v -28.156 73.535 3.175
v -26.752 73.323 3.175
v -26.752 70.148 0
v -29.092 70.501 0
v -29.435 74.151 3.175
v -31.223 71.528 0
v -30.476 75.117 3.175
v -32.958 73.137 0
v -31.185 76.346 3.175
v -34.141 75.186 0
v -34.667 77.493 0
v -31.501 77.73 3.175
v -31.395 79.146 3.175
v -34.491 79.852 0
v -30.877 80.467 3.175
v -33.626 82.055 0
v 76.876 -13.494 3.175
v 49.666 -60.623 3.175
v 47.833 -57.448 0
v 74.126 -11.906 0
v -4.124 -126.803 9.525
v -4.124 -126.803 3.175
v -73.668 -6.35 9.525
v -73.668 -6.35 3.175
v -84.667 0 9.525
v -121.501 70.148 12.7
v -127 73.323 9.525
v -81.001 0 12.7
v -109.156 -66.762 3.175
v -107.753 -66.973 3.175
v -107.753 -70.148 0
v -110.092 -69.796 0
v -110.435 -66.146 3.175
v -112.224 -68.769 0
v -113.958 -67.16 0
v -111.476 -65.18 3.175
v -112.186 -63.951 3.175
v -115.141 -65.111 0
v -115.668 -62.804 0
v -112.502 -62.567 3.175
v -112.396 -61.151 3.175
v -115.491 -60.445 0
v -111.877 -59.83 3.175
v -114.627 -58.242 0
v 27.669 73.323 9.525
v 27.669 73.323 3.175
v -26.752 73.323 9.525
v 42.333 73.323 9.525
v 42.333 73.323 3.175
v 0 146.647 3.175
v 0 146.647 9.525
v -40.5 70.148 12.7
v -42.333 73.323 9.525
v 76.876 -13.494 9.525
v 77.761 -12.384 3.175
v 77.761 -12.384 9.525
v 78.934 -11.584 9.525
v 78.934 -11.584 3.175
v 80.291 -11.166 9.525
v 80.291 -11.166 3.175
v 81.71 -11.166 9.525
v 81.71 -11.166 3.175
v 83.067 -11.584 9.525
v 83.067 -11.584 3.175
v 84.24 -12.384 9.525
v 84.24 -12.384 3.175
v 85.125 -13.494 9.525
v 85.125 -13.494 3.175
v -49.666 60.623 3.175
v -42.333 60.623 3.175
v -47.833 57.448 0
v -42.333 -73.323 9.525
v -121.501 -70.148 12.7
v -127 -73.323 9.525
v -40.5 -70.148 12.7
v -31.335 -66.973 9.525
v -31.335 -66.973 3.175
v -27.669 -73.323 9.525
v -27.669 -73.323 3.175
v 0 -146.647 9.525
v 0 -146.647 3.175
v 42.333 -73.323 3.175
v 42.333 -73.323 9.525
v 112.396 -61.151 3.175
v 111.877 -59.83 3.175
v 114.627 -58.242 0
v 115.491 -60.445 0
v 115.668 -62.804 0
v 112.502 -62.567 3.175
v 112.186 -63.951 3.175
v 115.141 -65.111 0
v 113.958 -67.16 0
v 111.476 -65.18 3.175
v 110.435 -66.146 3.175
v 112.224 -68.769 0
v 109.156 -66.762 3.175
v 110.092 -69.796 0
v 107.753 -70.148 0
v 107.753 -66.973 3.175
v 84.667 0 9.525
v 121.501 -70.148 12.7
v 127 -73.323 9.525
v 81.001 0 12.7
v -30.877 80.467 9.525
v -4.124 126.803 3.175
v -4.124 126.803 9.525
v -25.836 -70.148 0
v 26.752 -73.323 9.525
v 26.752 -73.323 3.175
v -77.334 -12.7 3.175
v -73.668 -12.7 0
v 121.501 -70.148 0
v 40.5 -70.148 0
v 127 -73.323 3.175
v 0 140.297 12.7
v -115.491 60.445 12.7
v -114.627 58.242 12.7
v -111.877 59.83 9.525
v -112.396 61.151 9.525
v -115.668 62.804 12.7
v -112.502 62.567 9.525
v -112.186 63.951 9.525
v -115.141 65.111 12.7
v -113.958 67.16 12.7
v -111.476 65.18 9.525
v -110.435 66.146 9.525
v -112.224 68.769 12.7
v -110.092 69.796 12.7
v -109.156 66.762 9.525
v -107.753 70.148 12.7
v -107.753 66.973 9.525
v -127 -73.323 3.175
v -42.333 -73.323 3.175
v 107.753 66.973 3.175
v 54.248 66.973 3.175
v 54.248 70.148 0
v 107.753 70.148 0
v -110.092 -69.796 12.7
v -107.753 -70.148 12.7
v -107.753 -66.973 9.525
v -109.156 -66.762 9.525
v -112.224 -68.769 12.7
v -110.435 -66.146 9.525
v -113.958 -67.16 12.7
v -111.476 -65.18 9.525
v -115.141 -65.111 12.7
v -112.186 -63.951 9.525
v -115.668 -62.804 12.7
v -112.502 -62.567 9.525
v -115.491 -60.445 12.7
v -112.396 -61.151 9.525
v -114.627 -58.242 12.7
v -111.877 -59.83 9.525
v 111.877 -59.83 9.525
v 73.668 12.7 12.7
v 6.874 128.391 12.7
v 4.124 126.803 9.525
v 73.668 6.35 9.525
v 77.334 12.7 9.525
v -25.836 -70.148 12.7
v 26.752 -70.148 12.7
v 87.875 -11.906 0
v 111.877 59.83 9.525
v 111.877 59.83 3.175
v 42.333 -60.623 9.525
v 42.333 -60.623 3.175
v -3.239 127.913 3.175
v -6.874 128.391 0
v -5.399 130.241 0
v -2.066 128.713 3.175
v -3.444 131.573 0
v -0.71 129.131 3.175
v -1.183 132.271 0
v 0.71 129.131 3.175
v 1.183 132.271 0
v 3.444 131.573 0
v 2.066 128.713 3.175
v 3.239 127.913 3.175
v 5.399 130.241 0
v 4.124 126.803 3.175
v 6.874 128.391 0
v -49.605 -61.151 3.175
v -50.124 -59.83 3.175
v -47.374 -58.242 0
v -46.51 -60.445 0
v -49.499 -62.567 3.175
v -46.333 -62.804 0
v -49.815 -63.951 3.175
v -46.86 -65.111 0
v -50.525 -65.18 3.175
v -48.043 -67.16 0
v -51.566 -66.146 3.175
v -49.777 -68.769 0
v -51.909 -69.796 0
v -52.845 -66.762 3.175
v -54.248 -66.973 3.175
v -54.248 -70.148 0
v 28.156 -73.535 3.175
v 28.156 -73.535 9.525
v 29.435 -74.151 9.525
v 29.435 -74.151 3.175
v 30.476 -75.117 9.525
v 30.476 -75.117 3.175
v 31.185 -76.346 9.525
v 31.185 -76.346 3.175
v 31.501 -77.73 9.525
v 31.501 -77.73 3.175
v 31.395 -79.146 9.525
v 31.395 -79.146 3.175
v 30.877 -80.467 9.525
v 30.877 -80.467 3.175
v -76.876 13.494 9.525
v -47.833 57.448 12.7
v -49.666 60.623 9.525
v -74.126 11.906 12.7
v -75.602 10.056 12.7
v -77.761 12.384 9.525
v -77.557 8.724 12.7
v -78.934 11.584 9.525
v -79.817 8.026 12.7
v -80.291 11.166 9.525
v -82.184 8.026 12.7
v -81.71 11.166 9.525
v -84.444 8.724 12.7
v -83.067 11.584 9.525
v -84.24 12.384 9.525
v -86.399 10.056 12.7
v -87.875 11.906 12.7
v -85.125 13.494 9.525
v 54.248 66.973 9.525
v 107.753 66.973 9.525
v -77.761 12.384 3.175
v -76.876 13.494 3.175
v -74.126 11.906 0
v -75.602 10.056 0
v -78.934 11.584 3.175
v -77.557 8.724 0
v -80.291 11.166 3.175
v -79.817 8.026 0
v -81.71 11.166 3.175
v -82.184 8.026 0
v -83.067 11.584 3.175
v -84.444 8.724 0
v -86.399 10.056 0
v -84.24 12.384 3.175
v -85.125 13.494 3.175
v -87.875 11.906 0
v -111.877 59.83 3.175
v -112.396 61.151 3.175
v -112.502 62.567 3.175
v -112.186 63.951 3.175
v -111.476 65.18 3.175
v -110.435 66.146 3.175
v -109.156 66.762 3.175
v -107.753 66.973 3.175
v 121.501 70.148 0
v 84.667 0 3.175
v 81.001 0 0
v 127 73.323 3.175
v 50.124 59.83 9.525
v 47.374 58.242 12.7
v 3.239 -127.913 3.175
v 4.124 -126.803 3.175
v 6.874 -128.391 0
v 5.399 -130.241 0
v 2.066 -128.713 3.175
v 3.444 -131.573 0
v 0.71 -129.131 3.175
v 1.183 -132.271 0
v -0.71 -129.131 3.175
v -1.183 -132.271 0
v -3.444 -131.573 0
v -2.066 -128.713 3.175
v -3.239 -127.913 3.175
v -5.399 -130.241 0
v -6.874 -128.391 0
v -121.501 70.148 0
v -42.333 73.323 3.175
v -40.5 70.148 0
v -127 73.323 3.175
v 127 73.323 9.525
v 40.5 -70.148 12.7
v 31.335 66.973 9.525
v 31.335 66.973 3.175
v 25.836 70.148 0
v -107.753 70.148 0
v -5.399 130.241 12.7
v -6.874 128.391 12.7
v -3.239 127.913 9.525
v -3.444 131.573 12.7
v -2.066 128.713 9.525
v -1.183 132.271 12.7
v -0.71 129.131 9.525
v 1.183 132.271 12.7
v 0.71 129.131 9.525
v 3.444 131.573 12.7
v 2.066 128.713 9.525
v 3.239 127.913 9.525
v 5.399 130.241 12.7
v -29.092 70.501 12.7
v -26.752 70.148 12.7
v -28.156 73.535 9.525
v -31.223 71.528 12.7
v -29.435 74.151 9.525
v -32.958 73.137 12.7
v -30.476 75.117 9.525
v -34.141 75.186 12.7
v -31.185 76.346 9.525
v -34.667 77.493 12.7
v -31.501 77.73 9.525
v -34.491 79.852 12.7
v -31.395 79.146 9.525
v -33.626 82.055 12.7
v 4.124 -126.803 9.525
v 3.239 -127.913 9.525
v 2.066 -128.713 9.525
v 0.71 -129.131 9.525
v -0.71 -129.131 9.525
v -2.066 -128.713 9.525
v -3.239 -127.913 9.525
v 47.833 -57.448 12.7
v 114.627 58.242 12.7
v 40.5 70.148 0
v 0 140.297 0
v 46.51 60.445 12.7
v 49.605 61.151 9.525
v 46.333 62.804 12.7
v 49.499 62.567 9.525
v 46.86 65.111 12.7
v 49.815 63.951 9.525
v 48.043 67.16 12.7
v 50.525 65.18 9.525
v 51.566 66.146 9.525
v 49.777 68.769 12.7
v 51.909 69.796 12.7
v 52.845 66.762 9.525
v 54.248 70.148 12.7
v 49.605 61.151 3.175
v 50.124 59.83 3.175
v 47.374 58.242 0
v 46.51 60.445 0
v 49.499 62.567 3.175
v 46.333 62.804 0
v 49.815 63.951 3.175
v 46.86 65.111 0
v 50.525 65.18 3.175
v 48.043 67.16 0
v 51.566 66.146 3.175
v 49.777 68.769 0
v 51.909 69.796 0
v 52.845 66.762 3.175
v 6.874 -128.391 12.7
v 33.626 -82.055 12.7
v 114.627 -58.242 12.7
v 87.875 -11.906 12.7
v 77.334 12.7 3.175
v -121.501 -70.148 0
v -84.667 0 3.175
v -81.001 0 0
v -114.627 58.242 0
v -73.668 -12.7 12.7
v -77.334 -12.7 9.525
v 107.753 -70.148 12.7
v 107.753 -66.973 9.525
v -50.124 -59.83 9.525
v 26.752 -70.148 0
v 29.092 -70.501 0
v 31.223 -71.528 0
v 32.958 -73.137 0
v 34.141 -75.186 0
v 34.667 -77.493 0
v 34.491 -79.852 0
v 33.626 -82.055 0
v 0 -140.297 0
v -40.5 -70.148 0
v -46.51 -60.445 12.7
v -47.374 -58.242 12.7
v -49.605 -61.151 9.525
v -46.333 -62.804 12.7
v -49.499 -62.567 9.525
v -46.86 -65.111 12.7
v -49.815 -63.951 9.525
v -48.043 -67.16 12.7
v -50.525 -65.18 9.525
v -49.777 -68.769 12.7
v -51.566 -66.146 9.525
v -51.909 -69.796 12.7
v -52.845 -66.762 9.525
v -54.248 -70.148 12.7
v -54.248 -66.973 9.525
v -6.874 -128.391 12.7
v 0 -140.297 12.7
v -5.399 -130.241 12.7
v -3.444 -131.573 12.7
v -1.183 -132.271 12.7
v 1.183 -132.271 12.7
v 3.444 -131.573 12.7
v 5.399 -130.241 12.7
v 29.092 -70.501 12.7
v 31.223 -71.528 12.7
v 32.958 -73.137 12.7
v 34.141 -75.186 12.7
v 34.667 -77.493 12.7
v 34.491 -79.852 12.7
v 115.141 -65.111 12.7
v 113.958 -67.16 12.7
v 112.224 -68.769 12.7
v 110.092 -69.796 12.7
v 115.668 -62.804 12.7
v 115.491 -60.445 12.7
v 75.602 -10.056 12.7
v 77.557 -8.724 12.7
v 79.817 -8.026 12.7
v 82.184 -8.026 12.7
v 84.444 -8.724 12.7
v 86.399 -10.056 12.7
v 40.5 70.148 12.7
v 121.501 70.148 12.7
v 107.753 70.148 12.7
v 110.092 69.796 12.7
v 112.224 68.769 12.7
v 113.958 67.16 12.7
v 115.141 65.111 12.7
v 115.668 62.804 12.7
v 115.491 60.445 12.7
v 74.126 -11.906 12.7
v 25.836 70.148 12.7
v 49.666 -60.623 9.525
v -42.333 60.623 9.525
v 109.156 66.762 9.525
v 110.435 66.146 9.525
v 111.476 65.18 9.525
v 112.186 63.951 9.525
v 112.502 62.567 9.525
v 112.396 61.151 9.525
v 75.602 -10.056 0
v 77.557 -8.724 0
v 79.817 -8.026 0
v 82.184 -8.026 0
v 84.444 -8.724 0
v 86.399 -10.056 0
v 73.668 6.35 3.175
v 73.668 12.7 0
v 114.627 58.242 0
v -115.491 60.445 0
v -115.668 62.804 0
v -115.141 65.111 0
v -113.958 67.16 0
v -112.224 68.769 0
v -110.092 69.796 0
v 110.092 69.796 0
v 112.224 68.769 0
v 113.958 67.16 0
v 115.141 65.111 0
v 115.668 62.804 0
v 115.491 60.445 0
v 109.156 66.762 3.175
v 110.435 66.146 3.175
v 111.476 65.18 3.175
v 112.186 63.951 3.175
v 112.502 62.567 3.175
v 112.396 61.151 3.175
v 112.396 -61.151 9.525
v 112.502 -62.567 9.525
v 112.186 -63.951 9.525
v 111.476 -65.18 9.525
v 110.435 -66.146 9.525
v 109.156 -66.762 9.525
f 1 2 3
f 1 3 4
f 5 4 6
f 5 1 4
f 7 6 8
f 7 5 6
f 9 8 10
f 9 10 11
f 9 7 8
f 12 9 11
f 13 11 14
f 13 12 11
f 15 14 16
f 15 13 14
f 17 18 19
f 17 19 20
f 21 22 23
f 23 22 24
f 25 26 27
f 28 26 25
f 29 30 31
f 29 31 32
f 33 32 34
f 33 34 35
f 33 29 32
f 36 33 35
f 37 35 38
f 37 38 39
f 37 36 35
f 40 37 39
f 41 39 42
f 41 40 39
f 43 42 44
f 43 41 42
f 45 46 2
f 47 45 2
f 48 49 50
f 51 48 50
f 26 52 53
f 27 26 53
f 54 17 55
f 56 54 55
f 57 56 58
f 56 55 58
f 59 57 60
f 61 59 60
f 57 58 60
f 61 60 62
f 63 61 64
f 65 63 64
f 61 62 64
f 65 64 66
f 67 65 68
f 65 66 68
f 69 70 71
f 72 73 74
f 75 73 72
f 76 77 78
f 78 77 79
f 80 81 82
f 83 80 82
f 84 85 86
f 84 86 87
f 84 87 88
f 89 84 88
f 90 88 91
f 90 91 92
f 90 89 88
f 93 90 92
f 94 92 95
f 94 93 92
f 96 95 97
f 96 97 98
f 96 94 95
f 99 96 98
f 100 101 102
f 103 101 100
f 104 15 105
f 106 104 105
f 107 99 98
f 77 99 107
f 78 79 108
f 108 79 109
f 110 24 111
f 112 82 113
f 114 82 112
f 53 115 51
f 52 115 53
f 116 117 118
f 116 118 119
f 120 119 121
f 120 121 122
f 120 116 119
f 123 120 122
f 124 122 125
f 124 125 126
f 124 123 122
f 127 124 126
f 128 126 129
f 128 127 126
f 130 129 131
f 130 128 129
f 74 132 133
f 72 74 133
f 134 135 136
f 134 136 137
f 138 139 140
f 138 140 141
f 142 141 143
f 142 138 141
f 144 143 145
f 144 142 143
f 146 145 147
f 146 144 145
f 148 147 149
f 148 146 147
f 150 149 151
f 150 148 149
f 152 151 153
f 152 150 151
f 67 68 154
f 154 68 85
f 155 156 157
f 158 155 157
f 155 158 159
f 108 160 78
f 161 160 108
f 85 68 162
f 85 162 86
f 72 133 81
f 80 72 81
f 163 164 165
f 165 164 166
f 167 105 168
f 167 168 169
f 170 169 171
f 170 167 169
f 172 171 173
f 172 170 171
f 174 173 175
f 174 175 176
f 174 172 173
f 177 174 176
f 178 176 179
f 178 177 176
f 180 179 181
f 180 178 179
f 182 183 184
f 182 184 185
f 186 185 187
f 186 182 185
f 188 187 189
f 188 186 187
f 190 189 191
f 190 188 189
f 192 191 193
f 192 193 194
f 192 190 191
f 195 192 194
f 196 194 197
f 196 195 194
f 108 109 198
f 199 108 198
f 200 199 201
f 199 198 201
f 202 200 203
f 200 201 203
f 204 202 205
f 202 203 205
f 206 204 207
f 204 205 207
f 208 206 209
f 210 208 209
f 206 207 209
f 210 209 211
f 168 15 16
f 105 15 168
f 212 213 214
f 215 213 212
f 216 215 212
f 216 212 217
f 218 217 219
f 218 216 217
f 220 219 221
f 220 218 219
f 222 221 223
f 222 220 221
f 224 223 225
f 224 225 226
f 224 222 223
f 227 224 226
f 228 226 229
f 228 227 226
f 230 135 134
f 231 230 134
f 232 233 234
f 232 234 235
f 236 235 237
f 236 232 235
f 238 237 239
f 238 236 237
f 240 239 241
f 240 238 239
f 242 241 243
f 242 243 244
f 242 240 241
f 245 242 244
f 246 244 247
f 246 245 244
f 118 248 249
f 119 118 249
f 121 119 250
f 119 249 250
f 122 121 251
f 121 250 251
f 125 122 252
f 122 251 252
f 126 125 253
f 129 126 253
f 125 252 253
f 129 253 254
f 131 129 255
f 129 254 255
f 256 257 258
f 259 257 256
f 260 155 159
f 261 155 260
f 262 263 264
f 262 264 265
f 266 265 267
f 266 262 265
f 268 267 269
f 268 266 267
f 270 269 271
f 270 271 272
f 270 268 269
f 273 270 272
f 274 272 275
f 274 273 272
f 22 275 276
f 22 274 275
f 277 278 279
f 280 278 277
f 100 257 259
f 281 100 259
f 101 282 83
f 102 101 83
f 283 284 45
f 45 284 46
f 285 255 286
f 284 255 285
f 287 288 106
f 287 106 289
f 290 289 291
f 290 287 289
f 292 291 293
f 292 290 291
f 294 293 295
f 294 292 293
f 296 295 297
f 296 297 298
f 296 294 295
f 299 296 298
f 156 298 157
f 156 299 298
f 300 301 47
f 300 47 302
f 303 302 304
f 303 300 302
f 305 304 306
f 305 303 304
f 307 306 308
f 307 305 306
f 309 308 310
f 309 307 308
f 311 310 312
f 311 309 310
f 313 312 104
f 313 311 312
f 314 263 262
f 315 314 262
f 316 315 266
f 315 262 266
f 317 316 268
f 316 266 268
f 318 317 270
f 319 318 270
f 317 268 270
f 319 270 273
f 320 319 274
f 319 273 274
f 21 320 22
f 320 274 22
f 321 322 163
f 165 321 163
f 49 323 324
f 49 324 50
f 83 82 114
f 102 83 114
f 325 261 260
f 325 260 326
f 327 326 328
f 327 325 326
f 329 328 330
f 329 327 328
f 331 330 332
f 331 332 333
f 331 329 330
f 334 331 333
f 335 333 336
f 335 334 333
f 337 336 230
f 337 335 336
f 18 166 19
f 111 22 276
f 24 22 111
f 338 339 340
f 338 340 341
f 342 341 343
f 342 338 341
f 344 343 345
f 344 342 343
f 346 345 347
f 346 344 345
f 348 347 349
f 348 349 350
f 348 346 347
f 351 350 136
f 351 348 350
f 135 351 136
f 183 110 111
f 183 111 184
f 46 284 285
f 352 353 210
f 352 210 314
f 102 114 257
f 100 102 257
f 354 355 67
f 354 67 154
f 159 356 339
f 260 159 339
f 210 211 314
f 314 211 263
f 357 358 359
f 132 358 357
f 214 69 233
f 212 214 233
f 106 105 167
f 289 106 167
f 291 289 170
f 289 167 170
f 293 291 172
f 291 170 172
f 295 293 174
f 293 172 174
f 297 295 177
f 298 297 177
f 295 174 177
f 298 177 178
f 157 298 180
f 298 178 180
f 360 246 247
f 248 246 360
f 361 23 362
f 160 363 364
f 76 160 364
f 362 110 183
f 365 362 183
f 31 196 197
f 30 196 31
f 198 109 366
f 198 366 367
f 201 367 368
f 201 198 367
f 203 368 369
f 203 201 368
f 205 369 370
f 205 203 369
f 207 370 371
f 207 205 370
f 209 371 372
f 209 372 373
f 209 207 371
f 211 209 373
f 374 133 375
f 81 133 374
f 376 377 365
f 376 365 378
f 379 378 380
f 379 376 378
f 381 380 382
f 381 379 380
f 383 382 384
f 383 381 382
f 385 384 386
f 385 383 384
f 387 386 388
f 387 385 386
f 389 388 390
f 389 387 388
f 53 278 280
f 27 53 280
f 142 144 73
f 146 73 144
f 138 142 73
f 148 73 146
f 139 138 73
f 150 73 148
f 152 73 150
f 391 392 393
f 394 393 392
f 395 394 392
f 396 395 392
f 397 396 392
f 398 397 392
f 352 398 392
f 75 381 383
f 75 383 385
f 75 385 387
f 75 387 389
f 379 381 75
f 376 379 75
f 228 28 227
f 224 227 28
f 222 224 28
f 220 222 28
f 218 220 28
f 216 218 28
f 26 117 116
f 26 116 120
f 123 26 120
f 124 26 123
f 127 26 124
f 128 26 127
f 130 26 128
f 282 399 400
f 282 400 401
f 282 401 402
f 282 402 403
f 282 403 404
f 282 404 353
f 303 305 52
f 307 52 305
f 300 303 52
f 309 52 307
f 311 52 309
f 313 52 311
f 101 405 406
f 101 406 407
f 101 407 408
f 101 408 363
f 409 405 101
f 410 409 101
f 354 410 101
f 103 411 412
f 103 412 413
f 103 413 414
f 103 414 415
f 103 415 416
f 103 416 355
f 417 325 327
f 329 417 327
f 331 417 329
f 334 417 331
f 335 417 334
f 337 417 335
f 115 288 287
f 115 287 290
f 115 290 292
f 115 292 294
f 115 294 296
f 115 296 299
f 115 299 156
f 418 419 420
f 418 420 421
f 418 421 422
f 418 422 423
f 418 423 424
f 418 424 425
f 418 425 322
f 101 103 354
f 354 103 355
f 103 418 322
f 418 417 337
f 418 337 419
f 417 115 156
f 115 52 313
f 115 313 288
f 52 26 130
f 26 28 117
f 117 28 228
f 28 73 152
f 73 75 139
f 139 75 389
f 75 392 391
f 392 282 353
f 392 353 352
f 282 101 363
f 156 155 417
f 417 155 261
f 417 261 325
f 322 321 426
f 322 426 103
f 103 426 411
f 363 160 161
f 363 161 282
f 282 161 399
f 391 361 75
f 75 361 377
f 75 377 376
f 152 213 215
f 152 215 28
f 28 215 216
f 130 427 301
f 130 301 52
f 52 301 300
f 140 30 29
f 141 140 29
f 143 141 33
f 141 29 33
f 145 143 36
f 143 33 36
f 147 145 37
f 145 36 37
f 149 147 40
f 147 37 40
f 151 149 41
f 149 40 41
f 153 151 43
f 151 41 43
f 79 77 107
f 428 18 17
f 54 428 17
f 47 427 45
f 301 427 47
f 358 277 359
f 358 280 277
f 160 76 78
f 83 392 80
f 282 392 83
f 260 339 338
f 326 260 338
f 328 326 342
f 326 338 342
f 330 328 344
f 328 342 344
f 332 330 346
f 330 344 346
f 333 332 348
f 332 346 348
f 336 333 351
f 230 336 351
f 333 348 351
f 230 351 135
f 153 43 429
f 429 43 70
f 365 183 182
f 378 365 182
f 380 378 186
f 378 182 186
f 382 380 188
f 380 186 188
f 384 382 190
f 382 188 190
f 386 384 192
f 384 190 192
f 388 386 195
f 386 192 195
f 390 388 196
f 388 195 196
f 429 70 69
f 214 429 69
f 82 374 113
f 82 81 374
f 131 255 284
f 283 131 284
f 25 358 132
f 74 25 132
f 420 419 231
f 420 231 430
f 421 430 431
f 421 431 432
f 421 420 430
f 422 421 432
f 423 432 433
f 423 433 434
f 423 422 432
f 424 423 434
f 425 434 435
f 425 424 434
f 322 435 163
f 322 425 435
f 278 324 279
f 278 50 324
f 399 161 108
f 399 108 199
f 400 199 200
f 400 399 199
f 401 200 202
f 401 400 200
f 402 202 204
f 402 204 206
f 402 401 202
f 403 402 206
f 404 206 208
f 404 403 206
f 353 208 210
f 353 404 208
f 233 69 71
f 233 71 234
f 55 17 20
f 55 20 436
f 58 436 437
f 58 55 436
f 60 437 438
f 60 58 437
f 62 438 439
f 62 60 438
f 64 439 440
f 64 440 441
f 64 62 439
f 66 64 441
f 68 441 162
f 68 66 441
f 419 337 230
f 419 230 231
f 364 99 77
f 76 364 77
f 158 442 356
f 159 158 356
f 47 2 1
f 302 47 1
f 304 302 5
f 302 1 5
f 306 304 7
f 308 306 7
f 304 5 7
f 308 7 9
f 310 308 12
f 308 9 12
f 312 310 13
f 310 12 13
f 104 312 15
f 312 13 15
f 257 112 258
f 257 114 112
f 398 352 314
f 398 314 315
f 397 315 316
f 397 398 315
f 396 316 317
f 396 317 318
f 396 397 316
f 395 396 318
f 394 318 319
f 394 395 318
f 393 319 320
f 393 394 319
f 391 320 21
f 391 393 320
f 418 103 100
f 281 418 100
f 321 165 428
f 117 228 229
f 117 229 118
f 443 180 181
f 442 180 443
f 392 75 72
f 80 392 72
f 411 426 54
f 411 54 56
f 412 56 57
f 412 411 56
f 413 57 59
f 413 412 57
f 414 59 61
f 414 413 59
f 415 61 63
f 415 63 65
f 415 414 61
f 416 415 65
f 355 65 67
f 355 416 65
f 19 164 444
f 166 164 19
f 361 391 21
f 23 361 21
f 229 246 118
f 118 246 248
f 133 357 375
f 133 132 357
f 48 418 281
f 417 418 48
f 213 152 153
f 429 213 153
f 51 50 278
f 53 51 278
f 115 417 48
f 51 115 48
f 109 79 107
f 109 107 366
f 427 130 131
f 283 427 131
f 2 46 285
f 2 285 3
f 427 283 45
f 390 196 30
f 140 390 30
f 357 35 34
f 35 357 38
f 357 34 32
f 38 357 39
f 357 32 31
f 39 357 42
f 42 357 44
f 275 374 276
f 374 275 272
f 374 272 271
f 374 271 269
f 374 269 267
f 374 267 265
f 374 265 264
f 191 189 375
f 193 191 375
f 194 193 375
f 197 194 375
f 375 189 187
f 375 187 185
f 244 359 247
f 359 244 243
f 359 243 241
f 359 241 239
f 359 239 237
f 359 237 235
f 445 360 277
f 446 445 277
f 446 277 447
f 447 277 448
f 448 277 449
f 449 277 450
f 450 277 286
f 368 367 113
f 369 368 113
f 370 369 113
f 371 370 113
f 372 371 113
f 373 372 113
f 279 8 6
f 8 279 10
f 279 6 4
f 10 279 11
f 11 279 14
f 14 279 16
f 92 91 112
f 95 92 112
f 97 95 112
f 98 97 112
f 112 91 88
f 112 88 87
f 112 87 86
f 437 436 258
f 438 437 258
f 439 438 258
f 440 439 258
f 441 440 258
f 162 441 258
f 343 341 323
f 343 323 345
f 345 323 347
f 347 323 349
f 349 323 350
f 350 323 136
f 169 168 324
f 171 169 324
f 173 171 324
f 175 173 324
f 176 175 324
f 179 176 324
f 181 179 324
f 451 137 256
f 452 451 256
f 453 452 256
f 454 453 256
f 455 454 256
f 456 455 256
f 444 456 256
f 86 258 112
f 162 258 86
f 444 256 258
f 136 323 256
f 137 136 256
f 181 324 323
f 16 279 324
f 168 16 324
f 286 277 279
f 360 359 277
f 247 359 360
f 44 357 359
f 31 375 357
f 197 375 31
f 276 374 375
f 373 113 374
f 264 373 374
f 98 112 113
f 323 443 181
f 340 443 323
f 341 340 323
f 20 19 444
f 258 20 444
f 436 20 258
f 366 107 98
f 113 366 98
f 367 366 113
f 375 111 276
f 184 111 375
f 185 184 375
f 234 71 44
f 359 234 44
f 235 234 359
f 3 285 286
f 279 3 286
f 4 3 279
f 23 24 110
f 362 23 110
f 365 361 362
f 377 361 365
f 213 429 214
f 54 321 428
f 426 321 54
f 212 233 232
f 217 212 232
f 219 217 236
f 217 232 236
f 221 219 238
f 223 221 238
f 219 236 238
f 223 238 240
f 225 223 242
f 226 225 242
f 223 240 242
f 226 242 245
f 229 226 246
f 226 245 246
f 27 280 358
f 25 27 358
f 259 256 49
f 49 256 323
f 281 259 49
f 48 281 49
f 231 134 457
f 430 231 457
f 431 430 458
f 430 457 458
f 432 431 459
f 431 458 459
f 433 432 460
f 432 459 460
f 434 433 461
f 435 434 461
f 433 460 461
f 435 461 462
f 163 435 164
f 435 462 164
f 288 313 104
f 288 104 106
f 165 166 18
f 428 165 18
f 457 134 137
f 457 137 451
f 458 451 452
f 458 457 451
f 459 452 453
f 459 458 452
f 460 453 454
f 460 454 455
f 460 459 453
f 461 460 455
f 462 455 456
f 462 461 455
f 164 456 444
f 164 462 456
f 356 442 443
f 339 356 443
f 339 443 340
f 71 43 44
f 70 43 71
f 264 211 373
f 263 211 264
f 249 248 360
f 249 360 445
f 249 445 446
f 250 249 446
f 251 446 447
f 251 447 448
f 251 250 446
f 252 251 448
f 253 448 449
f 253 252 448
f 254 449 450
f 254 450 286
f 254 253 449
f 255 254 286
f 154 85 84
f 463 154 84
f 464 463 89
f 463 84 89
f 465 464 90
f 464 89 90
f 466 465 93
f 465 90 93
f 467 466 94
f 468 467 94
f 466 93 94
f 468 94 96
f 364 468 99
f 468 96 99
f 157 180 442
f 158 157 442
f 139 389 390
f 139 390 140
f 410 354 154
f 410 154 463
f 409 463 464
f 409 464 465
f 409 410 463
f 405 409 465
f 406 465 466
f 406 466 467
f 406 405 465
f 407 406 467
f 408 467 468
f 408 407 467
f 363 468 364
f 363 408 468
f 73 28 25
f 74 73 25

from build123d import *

# Parameters (mm, degrees)
F1_DEPTH = 12.7
F2_SIZE  = 3.17499
F3_SIZE  = 3.17499


# Not quite as in the source:
# - a fillet or chamfer is up to 0.001 mm smaller than in the source, because OpenCascade refuses the exact size


with BuildPart() as f1:
    # F0 (on Top) → F1 (new body)
    with BuildSketch(Plane.XY):
        Polygon((42.3333333333, 73.3234841871), (0, 146.6469683742), (-42.3333333333, 73.3234841871), (-127, 73.3234841871), (-84.6666666667, 0), (-127, -73.3234841871), (-42.3333333333, -73.3234841871), (0, -146.6469683742), (42.3333333333, -73.3234841871), (127, -73.3234841871), (84.6666666667, 0), (127, 73.3234841871), align=None)
        with BuildLine():
            ThreePointArc((107.7525859006, 66.9734850526), (111.8770318861, 64.5922350526), (111.8770318861, 59.8297350526))
            Line((111.8770318861, 59.8297350526), (42.3333325205, -60.623485595))
            Line((42.3333325205, -60.623485595), (49.6656809392, -60.623485595))
            Line((49.6656809392, -60.623485595), (76.8760464718, -13.49375))
            ThreePointArc((76.8760464718, -13.49375), (81.0004924573, -11.1125), (85.1249384428, -13.49375))
            Line((85.1249384428, -13.49375), (111.8770318861, -59.8297350526))
            ThreePointArc((111.8770318861, -59.8297350526), (111.8770318861, -64.5922350526), (107.7525859006, -66.9734850526))
            Line((107.7525859006, -66.9734850526), (-31.3348102056, -66.9734850526))
            Line((-31.3348102056, -66.9734850526), (-27.6686364959, -73.3234841871))
            Line((-27.6686364959, -73.3234841871), (26.7520929436, -73.3234841871))
            ThreePointArc((26.7520929436, -73.3234841871), (30.8765389291, -75.7047341871), (30.8765389291, -80.4672341871))
            Line((30.8765389291, -80.4672341871), (4.1244459855, -126.8032183742))
            ThreePointArc((4.1244459855, -126.8032183742), (0, -129.1844683742), (-4.1244459855, -126.8032183742))
            Line((-4.1244459855, -126.8032183742), (-73.6681446525, -6.3499989368))
            Line((-73.6681446525, -6.3499989368), (-77.3343188618, -12.6999989368))
            Line((-77.3343188618, -12.6999989368), (-50.1239530285, -59.8297350526))
            ThreePointArc((-50.1239530285, -59.8297350526), (-50.1239530285, -64.5922350526), (-54.2483990141, -66.9734850526))
            Line((-54.2483990141, -66.9734850526), (-107.7525871283, -66.9734850526))
            ThreePointArc((-107.7525871283, -66.9734850526), (-111.8770331138, -64.5922350526), (-111.8770331138, -59.8297350526))
            Line((-111.8770331138, -59.8297350526), (-42.3333337482, 60.623485595))
            Line((-42.3333337482, 60.623485595), (-49.6656809392, 60.623485595))
            Line((-49.6656809392, 60.623485595), (-76.8760464718, 13.49375))
            ThreePointArc((-76.8760464718, 13.49375), (-81.0004924573, 11.1125), (-85.1249384428, 13.49375))
            Line((-85.1249384428, 13.49375), (-111.8770318861, 59.8297350526))
            ThreePointArc((-111.8770318861, 59.8297350526), (-111.8770318861, 64.5922350526), (-107.7525859006, 66.9734850526))
            Line((-107.7525859006, 66.9734850526), (31.3348102056, 66.9734850526))
            Line((31.3348102056, 66.9734850526), (27.6686364959, 73.3234841871))
            Line((27.6686364959, 73.3234841871), (-26.7520941713, 73.3234841871))
            ThreePointArc((-26.7520941713, 73.3234841871), (-30.8765401568, 75.7047341871), (-30.8765401568, 80.4672341871))
            Line((-30.8765401568, 80.4672341871), (-4.1244465994, 126.8032194374))
            ThreePointArc((-4.1244465994, 126.8032194374), (-6.138e-07, 129.1844694374), (4.1244453717, 126.8032194374))
            Line((4.1244453717, 126.8032194374), (73.6681440386, 6.35))
            Line((73.6681440386, 6.35), (77.334318248, 12.7))
            Line((77.334318248, 12.7), (50.1239530285, 59.8297350526))
            ThreePointArc((50.1239530285, 59.8297350526), (50.1239530285, 64.5922350526), (54.248399014, 66.9734850526))
            Line((54.248399014, 66.9734850526), (107.7525859006, 66.9734850526))
        make_face(mode=Mode.SUBTRACT)
    extrude(amount=F1_DEPTH)

    # F2 (size 3.175 in the source; OpenCascade refuses exactly that, so slightly less here)
    f2_edges = [f1.edges().sort_by_distance(p)[0] for p in [
        (105.833333, -36.661742, 12.7),
        (105.833333, 36.661742, 12.7),
        (84.666667, 73.323484, 12.7),
        (21.166667, 109.985226, 12.7),
        (-21.166667, 109.985226, 12.7),
        (-84.666667, 73.323484, 12.7),
        (-105.833333, 36.661742, 12.7),
        (-105.833333, -36.661742, 12.7),
        (-84.666667, -73.323484, 12.7),
        (-21.166667, -109.985226, 12.7),
        (21.166667, -109.985226, 12.7),
        (84.666667, -73.323484, 12.7),
        (38.896295, 66.57661, 12.7),
        (75.501231, 9.525, 12.7),
        (63.729136, 36.264868, 12.7),
        (50.123953, 64.592235, 12.7),
        (81.000492, 66.973485, 12.7),
        (111.877032, 64.592235, 12.7),
        (77.105182, -0.396875, 12.7),
        (45.999507, -60.623486, 12.7),
        (63.270864, -37.058618, 12.7),
        (81.000492, -11.1125, 12.7),
        (98.500985, -36.661743, 12.7),
        (111.877032, -64.592235, 12.7),
        (38.208888, -66.973485, 12.7),
        (-29.501723, -70.148485, 12.7),
        (-0.458272, -73.323484, 12.7),
        (30.876539, -75.704734, 12.7),
        (17.500492, -103.635226, 12.7),
        (0, -129.184468, 12.7),
        (-38.896295, -66.576609, 12.7),
        (-75.501232, -9.524999, 12.7),
        (-63.729136, -36.264867, 12.7),
        (-50.123953, -64.592235, 12.7),
        (-81.000493, -66.973485, 12.7),
        (-111.877033, -64.592235, 12.7),
        (-77.105183, 0.396875, 12.7),
        (-45.999507, 60.623486, 12.7),
        (-63.270864, 37.058618, 12.7),
        (-81.000492, 11.1125, 12.7),
        (-98.500985, 36.661743, 12.7),
        (-111.877032, 64.592235, 12.7),
        (-38.208888, 66.973485, 12.7),
        (29.501723, 70.148485, 12.7),
        (0.458271, 73.323484, 12.7),
        (-30.87654, 75.704734, 12.7),
        (-17.500493, 103.635227, 12.7),
        (-1e-06, 129.184469, 12.7),
    ]]
    chamfer(f2_edges, length=F2_SIZE)

    # F3 (size 3.175 in the source; OpenCascade refuses exactly that, so slightly less here)
    f3_edges = [f1.edges().sort_by_distance(p)[0] for p in [
        (105.833333, -36.661742, 0),
        (105.833333, 36.661742, 0),
        (84.666667, 73.323484, 0),
        (21.166667, 109.985226, 0),
        (-21.166667, 109.985226, 0),
        (-84.666667, 73.323484, 0),
        (-105.833333, 36.661742, 0),
        (-105.833333, -36.661742, 0),
        (-84.666667, -73.323484, 0),
        (-21.166667, -109.985226, 0),
        (21.166667, -109.985226, 0),
        (84.666667, -73.323484, 0),
        (38.896295, 66.57661, 0),
        (75.501231, 9.525, 0),
        (63.729136, 36.264868, 0),
        (50.123953, 64.592235, 0),
        (81.000492, 66.973485, 0),
        (111.877032, 64.592235, 0),
        (77.105182, -0.396875, 0),
        (45.999507, -60.623486, 0),
        (63.270864, -37.058618, 0),
        (81.000492, -11.1125, 0),
        (98.500985, -36.661743, 0),
        (111.877032, -64.592235, 0),
        (38.208888, -66.973485, 0),
        (-29.501723, -70.148485, 0),
        (-0.458272, -73.323484, 0),
        (30.876539, -75.704734, 0),
        (17.500492, -103.635226, 0),
        (0, -129.184468, 0),
        (-38.896295, -66.576609, 0),
        (-75.501232, -9.524999, 0),
        (-63.729136, -36.264867, 0),
        (-50.123953, -64.592235, 0),
        (-81.000493, -66.973485, 0),
        (-111.877033, -64.592235, 0),
        (-77.105183, 0.396875, 0),
        (-45.999507, 60.623486, 0),
        (-63.270864, 37.058618, 0),
        (-81.000492, 11.1125, 0),
        (-98.500985, 36.661743, 0),
        (-111.877032, 64.592235, 0),
        (-38.208888, 66.973485, 0),
        (29.501723, 70.148485, 0),
        (0.458271, 73.323484, 0),
        (-30.87654, 75.704734, 0),
        (-17.500493, 103.635227, 0),
        (-1e-06, 129.184469, 0),
    ]]
    chamfer(f3_edges, length=F3_SIZE)


solid = f1.part
